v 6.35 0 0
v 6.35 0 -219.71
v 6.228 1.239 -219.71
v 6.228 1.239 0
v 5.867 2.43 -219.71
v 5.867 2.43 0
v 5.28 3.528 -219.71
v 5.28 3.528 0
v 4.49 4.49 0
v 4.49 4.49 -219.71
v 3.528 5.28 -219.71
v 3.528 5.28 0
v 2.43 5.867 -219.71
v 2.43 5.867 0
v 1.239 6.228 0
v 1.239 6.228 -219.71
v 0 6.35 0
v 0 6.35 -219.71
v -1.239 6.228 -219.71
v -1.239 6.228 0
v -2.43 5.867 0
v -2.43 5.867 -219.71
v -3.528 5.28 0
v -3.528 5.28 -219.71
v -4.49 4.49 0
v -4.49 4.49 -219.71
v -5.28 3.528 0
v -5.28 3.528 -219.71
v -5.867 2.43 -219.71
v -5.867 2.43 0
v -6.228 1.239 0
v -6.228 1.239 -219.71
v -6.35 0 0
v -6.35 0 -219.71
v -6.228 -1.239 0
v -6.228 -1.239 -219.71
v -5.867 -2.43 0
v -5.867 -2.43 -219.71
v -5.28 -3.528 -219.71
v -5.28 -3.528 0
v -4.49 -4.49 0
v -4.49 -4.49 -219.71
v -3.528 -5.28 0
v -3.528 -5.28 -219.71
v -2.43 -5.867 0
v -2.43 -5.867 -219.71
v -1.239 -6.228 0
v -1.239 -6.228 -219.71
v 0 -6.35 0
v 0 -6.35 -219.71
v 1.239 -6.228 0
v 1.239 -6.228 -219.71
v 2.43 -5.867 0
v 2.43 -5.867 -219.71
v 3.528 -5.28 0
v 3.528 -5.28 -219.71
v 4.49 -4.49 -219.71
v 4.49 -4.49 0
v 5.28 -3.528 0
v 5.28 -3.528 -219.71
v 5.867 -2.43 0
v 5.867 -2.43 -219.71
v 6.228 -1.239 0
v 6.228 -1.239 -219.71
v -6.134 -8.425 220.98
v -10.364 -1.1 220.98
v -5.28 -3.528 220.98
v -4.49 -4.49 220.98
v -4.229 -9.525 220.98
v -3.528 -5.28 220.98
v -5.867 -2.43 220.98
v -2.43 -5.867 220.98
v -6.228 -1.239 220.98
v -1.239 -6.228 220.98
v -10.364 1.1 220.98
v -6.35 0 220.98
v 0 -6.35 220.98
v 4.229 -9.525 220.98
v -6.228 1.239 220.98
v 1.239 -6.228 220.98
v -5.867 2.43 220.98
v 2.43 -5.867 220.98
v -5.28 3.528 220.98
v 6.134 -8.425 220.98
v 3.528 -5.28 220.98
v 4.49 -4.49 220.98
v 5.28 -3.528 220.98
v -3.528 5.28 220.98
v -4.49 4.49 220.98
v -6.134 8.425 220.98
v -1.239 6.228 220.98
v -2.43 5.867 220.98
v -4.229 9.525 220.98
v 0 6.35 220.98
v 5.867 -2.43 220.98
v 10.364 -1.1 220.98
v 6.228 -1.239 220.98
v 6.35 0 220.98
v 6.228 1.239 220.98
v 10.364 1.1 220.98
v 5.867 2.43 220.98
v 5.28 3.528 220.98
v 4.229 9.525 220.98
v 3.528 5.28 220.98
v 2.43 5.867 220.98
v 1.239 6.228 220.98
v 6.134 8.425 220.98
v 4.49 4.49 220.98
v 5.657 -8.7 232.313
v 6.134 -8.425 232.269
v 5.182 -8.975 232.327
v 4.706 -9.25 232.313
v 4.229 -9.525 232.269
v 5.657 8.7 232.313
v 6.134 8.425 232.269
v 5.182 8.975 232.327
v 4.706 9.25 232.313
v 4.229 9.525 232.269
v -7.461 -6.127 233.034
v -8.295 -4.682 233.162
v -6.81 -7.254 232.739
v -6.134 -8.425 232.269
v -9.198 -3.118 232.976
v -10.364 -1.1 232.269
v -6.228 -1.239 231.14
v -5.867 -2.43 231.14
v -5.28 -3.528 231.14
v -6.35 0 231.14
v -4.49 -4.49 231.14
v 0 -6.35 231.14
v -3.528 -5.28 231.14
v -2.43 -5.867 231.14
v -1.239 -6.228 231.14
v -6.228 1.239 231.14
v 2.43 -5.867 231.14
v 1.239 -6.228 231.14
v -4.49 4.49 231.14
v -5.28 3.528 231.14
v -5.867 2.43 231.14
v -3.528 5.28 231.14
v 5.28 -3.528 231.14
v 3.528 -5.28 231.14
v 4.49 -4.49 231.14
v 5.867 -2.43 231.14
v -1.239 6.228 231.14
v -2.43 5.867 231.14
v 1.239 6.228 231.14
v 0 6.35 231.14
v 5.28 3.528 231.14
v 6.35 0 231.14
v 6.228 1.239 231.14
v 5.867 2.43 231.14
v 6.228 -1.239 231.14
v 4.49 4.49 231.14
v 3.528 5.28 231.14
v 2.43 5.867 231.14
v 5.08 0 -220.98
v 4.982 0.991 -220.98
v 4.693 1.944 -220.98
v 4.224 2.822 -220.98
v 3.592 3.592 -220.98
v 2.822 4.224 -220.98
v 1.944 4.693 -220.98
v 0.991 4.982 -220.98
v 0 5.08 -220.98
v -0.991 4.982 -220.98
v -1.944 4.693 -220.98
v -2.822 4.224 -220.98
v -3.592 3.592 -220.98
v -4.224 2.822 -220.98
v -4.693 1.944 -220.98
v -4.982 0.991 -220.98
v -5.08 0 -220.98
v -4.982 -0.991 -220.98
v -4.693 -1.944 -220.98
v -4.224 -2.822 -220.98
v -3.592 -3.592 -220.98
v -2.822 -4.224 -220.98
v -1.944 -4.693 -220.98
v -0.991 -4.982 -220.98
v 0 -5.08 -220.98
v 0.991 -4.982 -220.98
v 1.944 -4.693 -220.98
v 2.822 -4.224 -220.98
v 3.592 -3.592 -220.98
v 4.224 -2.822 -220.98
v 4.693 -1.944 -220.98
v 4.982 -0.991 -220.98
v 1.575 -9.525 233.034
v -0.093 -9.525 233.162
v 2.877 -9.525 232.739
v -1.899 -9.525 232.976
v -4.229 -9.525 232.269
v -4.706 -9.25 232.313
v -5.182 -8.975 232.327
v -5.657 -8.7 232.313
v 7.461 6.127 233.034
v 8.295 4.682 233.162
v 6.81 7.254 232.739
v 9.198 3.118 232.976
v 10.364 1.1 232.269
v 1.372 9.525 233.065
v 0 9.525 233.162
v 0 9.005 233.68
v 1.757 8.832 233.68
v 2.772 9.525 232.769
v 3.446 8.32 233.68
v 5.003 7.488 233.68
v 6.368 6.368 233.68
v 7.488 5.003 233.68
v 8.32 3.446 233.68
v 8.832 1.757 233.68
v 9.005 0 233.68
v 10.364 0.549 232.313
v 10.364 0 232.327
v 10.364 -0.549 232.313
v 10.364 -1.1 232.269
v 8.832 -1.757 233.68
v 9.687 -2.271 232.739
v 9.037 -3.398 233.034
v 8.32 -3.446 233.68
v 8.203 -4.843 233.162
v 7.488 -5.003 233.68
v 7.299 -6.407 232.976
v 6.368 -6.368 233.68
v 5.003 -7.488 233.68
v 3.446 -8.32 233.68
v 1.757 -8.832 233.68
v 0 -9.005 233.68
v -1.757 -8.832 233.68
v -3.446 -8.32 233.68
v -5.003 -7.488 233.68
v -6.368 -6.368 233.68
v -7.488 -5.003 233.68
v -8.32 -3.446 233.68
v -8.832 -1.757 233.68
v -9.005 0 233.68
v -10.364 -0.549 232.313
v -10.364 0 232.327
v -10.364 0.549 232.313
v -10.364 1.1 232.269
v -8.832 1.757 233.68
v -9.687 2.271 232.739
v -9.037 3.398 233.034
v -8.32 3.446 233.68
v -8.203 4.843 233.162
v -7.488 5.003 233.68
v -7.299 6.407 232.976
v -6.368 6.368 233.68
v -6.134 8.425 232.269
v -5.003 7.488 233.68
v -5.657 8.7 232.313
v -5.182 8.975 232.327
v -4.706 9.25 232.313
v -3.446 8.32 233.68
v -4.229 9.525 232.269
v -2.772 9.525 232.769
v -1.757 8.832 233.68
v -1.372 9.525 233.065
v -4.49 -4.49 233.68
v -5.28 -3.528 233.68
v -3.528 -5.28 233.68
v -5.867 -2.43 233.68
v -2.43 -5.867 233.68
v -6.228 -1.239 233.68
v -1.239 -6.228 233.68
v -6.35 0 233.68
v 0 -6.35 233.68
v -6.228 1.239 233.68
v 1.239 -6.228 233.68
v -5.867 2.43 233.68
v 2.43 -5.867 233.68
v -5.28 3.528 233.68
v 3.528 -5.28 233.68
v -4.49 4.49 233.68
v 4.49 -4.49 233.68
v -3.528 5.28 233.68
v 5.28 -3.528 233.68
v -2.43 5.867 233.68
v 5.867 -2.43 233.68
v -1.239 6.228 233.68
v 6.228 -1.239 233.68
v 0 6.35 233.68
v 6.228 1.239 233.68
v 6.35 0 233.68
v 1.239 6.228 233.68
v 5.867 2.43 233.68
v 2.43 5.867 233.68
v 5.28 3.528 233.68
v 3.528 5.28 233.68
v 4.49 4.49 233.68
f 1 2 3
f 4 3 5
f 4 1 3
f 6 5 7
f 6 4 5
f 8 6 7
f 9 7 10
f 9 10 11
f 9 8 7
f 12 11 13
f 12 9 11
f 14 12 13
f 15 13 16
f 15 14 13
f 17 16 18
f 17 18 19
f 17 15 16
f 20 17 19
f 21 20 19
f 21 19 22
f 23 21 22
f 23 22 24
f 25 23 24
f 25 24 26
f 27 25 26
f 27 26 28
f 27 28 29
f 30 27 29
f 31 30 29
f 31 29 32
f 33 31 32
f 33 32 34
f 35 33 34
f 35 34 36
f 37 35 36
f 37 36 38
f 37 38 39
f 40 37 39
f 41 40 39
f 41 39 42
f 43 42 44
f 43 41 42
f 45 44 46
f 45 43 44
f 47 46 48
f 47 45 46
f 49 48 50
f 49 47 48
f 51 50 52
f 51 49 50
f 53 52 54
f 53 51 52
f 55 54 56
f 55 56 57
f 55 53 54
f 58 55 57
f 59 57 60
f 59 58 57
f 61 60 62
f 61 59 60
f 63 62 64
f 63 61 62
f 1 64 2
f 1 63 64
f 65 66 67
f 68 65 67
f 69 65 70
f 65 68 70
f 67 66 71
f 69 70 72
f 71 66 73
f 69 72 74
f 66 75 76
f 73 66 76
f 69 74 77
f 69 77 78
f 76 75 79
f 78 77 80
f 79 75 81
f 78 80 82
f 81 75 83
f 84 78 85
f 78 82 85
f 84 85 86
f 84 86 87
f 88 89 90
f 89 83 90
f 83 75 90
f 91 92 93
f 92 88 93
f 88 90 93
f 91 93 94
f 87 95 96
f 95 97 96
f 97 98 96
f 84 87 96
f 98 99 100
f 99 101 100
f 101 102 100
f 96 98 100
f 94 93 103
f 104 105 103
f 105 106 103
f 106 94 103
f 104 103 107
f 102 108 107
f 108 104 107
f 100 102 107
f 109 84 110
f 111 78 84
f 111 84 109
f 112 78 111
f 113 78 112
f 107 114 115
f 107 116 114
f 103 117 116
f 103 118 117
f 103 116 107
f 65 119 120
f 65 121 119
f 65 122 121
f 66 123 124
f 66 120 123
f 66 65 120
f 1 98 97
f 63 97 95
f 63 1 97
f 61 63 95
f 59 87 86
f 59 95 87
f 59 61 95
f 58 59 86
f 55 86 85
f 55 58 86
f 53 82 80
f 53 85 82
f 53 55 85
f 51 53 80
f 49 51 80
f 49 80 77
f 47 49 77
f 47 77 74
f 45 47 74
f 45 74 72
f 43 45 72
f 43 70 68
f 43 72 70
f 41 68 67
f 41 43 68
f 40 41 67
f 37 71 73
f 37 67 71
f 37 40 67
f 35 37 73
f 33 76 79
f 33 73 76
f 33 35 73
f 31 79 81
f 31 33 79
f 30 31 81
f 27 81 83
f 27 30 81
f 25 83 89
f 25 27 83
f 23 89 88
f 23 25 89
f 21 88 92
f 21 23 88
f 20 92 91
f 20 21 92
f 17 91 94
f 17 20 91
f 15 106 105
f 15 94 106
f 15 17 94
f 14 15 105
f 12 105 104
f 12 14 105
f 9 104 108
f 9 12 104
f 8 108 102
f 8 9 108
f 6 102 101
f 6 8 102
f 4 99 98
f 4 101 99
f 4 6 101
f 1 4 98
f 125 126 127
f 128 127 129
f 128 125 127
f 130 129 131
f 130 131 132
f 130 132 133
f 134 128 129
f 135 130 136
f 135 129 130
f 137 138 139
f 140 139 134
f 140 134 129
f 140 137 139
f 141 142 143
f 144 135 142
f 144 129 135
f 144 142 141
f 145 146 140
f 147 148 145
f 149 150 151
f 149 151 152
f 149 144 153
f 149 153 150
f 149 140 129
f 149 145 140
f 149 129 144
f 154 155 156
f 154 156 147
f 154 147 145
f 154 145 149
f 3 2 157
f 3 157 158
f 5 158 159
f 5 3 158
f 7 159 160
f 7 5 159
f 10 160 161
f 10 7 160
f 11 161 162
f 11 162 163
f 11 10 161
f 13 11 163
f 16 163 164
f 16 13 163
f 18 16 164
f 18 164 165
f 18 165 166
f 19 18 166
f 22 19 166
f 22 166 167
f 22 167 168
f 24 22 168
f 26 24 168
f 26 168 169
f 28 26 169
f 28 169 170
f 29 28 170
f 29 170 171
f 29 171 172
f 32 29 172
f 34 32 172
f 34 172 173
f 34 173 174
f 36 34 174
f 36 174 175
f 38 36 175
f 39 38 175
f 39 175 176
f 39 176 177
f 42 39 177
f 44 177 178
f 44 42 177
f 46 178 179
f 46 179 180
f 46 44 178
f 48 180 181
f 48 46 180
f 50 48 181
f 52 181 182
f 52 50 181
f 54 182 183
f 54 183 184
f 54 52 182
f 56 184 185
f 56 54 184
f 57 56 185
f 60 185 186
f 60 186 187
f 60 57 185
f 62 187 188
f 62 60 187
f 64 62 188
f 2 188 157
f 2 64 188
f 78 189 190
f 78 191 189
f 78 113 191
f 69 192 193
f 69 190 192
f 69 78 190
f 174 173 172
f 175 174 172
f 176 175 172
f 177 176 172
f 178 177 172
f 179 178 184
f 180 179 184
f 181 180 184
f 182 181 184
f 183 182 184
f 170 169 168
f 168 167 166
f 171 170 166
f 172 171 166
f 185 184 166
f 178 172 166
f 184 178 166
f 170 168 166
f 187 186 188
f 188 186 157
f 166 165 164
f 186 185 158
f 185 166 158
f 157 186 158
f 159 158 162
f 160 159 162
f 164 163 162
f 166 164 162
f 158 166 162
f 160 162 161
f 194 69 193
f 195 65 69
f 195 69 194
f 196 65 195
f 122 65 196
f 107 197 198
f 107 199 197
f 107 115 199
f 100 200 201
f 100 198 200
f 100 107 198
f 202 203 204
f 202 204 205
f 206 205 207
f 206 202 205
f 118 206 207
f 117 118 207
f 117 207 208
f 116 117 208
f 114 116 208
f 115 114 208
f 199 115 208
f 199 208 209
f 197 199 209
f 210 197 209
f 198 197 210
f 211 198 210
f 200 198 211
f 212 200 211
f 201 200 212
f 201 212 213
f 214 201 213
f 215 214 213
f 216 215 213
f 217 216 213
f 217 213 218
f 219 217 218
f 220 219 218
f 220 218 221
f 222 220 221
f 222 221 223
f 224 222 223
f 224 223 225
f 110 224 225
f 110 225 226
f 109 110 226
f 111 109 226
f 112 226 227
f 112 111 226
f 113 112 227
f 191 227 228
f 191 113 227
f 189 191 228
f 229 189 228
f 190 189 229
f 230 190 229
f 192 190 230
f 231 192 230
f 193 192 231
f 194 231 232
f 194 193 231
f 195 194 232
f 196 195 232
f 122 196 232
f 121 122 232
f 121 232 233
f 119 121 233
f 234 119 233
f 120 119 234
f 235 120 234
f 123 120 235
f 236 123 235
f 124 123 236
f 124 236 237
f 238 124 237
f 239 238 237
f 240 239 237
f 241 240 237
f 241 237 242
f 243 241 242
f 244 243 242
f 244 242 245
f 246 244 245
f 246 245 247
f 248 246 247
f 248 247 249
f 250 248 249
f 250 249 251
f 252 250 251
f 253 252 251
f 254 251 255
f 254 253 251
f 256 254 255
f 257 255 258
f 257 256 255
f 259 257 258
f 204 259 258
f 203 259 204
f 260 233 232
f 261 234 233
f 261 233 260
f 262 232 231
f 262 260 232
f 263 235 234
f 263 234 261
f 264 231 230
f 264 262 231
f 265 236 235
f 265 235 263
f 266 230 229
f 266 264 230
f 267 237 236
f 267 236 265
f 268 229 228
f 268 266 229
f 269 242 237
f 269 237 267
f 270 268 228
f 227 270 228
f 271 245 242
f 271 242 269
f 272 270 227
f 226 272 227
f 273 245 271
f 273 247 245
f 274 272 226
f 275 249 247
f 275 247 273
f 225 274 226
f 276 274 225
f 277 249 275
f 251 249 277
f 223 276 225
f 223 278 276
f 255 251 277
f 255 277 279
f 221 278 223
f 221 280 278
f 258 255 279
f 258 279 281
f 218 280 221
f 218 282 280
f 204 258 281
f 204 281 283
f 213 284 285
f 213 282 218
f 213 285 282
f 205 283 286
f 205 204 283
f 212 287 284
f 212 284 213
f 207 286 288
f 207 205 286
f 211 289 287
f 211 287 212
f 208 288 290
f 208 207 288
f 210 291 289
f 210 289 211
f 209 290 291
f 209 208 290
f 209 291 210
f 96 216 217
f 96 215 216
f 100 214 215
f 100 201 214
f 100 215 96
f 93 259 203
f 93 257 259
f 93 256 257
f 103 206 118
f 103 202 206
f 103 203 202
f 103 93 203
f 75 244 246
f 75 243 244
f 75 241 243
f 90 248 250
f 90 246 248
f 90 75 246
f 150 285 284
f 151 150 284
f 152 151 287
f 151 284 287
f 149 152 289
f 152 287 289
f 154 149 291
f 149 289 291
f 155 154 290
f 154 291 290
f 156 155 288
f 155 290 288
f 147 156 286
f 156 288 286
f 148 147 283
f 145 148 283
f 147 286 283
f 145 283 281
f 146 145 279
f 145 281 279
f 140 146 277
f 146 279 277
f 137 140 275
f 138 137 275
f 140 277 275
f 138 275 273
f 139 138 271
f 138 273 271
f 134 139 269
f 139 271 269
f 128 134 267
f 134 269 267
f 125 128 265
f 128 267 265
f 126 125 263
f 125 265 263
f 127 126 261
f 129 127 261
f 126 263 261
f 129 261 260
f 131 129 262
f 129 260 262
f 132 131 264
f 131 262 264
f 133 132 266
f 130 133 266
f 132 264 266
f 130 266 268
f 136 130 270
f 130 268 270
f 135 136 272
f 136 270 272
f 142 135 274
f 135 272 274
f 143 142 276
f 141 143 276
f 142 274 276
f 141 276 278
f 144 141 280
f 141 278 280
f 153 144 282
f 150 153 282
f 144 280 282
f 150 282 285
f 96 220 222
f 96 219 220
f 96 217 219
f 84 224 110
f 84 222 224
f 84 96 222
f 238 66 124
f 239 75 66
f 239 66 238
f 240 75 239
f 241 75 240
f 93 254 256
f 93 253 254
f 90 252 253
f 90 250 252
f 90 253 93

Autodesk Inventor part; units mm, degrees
ref_plane "YZ Plane" through (0, 0, 0) normal (1, 0, 0) x (0, 1, 0)
ref_plane "XZ Plane" through (0, 0, 0) normal (0, 1, 0) x (-1, 0, 0)
ref_plane "XY Plane" through (0, 0, 0) normal (0, 0, 1) x (1, 0, 0)
sketch "Sketch2" plane through (0, 0, 0) normal (0, 0, 1) x (1, 0, 0)
  circle A0 centre (0, 0) radius 6.35
  dimension "d0" = 12.7
extrude "Extrusion1" add sketch "Sketch2" along normal mid plane 441.96
chamfer "Chamfer1" distance 1.27 angle 45 1 edges at (-6.35, 0, -220.98)
sketch "Sketch3" plane through (0, 0, 220.98) normal (0, 0, 1) x (1, 0, 0)
  line L0 (10.9985, 0) -> (5.4993, -9.525)
  line L1 (5.4993, -9.525) -> (-5.4993, -9.525)
  line L2 (-5.4993, -9.525) -> (-10.9985, 0)
  line L3 (-10.9985, 0) -> (-5.4993, 9.525)
  line L4 (-5.4993, 9.525) -> (5.4993, 9.525)
  line L5 (5.4993, 9.525) -> (10.9985, 0)
  point P0 (0, 0)
  point P1 (0, 0)
  dimension "d6" = 19.05
extrude "Extrusion2" add sketch "Sketch3" along normal blind 12.7
sketch "Sketch4" plane through (0, 0, 233.68) normal (0, 0, 1) x (1, 0, 0)
  circle A0 centre (0, 0) radius 6.35
extrude "Extrusion3" cut sketch "Sketch4" against normal blind 2.54
sketch "Sketch5" plane through (0, 0, 0) normal (1, 0, 0) x (0, 1, 0)
  line L0 (0, 233.68) -> (9.525, 233.68) projected
  line L1 (9.525, 233.68) -> (11.1053, 233.68) construction
  line L2 (13.1997, 229.5016) -> (7.8979, 234.7834)
  line L3 (7.8979, 234.7834) -> (10.6425, 234.7834)
  line L4 (10.6425, 234.7834) -> (13.1997, 229.5016)
  line L5 (0, -312.1327) -> (0, 325.9361) projected
  point P0 (0, 0)
revolve "Revolution1" cut sketch "Sketch5" angle 360 about axis through (0, 0, -10) along (0, 0, 1)
chamfer "Chamfer2" distance 1.27 angle 45 6 edges at (5.4993, 9.525, 226.3372) (10.9985, 0, 226.3372) (5.4993, -9.525, 226.3372) (-5.4993, -9.525, 226.3372) (-10.9985, 0, 226.3372) (-5.4993, 9.525, 226.3372)
properties part number "Through bolt"
